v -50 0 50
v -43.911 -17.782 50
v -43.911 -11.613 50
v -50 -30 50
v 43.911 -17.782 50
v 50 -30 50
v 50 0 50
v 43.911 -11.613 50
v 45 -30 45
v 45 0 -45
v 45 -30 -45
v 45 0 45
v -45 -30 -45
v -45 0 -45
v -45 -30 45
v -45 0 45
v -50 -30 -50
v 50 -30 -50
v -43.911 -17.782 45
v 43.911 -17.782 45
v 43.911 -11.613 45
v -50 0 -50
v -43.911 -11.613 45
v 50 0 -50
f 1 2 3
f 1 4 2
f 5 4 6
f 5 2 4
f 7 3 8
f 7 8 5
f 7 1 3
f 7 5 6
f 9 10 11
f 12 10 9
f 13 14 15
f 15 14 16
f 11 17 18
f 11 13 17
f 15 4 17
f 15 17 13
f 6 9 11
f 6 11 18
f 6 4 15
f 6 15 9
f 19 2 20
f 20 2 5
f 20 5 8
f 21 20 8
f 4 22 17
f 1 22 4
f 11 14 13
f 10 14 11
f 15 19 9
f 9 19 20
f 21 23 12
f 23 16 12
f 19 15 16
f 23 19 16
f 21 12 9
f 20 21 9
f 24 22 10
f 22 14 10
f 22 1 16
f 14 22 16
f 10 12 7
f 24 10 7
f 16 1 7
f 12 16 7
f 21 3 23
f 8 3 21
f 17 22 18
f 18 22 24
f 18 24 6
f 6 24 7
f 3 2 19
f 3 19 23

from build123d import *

# Parameters (mm, degrees)
F0_W     = 100
F0_H     = 100
F0_W_2   = 90
F0_H_2   = 90
F1_DEPTH = 30
F2_W     = 87.822602
F2_H     = 6.169355
F3_DEPTH = 25


with BuildPart() as f1:
    # F0 (on Front) → F1 (new body)
    with BuildSketch(Plane.XZ):
        Rectangle(F0_W, F0_H)
        Rectangle(F0_W_2, F0_H_2, mode=Mode.SUBTRACT)
    extrude(amount=F1_DEPTH)

    # F2 (on face) → F3 (cut)
    with BuildSketch(Plane.XY.offset(50)):
        with Locations((0, -14.697582)):
            Rectangle(F2_W, F2_H)
    extrude(amount=-F3_DEPTH, mode=Mode.SUBTRACT)


solid = f1.part
